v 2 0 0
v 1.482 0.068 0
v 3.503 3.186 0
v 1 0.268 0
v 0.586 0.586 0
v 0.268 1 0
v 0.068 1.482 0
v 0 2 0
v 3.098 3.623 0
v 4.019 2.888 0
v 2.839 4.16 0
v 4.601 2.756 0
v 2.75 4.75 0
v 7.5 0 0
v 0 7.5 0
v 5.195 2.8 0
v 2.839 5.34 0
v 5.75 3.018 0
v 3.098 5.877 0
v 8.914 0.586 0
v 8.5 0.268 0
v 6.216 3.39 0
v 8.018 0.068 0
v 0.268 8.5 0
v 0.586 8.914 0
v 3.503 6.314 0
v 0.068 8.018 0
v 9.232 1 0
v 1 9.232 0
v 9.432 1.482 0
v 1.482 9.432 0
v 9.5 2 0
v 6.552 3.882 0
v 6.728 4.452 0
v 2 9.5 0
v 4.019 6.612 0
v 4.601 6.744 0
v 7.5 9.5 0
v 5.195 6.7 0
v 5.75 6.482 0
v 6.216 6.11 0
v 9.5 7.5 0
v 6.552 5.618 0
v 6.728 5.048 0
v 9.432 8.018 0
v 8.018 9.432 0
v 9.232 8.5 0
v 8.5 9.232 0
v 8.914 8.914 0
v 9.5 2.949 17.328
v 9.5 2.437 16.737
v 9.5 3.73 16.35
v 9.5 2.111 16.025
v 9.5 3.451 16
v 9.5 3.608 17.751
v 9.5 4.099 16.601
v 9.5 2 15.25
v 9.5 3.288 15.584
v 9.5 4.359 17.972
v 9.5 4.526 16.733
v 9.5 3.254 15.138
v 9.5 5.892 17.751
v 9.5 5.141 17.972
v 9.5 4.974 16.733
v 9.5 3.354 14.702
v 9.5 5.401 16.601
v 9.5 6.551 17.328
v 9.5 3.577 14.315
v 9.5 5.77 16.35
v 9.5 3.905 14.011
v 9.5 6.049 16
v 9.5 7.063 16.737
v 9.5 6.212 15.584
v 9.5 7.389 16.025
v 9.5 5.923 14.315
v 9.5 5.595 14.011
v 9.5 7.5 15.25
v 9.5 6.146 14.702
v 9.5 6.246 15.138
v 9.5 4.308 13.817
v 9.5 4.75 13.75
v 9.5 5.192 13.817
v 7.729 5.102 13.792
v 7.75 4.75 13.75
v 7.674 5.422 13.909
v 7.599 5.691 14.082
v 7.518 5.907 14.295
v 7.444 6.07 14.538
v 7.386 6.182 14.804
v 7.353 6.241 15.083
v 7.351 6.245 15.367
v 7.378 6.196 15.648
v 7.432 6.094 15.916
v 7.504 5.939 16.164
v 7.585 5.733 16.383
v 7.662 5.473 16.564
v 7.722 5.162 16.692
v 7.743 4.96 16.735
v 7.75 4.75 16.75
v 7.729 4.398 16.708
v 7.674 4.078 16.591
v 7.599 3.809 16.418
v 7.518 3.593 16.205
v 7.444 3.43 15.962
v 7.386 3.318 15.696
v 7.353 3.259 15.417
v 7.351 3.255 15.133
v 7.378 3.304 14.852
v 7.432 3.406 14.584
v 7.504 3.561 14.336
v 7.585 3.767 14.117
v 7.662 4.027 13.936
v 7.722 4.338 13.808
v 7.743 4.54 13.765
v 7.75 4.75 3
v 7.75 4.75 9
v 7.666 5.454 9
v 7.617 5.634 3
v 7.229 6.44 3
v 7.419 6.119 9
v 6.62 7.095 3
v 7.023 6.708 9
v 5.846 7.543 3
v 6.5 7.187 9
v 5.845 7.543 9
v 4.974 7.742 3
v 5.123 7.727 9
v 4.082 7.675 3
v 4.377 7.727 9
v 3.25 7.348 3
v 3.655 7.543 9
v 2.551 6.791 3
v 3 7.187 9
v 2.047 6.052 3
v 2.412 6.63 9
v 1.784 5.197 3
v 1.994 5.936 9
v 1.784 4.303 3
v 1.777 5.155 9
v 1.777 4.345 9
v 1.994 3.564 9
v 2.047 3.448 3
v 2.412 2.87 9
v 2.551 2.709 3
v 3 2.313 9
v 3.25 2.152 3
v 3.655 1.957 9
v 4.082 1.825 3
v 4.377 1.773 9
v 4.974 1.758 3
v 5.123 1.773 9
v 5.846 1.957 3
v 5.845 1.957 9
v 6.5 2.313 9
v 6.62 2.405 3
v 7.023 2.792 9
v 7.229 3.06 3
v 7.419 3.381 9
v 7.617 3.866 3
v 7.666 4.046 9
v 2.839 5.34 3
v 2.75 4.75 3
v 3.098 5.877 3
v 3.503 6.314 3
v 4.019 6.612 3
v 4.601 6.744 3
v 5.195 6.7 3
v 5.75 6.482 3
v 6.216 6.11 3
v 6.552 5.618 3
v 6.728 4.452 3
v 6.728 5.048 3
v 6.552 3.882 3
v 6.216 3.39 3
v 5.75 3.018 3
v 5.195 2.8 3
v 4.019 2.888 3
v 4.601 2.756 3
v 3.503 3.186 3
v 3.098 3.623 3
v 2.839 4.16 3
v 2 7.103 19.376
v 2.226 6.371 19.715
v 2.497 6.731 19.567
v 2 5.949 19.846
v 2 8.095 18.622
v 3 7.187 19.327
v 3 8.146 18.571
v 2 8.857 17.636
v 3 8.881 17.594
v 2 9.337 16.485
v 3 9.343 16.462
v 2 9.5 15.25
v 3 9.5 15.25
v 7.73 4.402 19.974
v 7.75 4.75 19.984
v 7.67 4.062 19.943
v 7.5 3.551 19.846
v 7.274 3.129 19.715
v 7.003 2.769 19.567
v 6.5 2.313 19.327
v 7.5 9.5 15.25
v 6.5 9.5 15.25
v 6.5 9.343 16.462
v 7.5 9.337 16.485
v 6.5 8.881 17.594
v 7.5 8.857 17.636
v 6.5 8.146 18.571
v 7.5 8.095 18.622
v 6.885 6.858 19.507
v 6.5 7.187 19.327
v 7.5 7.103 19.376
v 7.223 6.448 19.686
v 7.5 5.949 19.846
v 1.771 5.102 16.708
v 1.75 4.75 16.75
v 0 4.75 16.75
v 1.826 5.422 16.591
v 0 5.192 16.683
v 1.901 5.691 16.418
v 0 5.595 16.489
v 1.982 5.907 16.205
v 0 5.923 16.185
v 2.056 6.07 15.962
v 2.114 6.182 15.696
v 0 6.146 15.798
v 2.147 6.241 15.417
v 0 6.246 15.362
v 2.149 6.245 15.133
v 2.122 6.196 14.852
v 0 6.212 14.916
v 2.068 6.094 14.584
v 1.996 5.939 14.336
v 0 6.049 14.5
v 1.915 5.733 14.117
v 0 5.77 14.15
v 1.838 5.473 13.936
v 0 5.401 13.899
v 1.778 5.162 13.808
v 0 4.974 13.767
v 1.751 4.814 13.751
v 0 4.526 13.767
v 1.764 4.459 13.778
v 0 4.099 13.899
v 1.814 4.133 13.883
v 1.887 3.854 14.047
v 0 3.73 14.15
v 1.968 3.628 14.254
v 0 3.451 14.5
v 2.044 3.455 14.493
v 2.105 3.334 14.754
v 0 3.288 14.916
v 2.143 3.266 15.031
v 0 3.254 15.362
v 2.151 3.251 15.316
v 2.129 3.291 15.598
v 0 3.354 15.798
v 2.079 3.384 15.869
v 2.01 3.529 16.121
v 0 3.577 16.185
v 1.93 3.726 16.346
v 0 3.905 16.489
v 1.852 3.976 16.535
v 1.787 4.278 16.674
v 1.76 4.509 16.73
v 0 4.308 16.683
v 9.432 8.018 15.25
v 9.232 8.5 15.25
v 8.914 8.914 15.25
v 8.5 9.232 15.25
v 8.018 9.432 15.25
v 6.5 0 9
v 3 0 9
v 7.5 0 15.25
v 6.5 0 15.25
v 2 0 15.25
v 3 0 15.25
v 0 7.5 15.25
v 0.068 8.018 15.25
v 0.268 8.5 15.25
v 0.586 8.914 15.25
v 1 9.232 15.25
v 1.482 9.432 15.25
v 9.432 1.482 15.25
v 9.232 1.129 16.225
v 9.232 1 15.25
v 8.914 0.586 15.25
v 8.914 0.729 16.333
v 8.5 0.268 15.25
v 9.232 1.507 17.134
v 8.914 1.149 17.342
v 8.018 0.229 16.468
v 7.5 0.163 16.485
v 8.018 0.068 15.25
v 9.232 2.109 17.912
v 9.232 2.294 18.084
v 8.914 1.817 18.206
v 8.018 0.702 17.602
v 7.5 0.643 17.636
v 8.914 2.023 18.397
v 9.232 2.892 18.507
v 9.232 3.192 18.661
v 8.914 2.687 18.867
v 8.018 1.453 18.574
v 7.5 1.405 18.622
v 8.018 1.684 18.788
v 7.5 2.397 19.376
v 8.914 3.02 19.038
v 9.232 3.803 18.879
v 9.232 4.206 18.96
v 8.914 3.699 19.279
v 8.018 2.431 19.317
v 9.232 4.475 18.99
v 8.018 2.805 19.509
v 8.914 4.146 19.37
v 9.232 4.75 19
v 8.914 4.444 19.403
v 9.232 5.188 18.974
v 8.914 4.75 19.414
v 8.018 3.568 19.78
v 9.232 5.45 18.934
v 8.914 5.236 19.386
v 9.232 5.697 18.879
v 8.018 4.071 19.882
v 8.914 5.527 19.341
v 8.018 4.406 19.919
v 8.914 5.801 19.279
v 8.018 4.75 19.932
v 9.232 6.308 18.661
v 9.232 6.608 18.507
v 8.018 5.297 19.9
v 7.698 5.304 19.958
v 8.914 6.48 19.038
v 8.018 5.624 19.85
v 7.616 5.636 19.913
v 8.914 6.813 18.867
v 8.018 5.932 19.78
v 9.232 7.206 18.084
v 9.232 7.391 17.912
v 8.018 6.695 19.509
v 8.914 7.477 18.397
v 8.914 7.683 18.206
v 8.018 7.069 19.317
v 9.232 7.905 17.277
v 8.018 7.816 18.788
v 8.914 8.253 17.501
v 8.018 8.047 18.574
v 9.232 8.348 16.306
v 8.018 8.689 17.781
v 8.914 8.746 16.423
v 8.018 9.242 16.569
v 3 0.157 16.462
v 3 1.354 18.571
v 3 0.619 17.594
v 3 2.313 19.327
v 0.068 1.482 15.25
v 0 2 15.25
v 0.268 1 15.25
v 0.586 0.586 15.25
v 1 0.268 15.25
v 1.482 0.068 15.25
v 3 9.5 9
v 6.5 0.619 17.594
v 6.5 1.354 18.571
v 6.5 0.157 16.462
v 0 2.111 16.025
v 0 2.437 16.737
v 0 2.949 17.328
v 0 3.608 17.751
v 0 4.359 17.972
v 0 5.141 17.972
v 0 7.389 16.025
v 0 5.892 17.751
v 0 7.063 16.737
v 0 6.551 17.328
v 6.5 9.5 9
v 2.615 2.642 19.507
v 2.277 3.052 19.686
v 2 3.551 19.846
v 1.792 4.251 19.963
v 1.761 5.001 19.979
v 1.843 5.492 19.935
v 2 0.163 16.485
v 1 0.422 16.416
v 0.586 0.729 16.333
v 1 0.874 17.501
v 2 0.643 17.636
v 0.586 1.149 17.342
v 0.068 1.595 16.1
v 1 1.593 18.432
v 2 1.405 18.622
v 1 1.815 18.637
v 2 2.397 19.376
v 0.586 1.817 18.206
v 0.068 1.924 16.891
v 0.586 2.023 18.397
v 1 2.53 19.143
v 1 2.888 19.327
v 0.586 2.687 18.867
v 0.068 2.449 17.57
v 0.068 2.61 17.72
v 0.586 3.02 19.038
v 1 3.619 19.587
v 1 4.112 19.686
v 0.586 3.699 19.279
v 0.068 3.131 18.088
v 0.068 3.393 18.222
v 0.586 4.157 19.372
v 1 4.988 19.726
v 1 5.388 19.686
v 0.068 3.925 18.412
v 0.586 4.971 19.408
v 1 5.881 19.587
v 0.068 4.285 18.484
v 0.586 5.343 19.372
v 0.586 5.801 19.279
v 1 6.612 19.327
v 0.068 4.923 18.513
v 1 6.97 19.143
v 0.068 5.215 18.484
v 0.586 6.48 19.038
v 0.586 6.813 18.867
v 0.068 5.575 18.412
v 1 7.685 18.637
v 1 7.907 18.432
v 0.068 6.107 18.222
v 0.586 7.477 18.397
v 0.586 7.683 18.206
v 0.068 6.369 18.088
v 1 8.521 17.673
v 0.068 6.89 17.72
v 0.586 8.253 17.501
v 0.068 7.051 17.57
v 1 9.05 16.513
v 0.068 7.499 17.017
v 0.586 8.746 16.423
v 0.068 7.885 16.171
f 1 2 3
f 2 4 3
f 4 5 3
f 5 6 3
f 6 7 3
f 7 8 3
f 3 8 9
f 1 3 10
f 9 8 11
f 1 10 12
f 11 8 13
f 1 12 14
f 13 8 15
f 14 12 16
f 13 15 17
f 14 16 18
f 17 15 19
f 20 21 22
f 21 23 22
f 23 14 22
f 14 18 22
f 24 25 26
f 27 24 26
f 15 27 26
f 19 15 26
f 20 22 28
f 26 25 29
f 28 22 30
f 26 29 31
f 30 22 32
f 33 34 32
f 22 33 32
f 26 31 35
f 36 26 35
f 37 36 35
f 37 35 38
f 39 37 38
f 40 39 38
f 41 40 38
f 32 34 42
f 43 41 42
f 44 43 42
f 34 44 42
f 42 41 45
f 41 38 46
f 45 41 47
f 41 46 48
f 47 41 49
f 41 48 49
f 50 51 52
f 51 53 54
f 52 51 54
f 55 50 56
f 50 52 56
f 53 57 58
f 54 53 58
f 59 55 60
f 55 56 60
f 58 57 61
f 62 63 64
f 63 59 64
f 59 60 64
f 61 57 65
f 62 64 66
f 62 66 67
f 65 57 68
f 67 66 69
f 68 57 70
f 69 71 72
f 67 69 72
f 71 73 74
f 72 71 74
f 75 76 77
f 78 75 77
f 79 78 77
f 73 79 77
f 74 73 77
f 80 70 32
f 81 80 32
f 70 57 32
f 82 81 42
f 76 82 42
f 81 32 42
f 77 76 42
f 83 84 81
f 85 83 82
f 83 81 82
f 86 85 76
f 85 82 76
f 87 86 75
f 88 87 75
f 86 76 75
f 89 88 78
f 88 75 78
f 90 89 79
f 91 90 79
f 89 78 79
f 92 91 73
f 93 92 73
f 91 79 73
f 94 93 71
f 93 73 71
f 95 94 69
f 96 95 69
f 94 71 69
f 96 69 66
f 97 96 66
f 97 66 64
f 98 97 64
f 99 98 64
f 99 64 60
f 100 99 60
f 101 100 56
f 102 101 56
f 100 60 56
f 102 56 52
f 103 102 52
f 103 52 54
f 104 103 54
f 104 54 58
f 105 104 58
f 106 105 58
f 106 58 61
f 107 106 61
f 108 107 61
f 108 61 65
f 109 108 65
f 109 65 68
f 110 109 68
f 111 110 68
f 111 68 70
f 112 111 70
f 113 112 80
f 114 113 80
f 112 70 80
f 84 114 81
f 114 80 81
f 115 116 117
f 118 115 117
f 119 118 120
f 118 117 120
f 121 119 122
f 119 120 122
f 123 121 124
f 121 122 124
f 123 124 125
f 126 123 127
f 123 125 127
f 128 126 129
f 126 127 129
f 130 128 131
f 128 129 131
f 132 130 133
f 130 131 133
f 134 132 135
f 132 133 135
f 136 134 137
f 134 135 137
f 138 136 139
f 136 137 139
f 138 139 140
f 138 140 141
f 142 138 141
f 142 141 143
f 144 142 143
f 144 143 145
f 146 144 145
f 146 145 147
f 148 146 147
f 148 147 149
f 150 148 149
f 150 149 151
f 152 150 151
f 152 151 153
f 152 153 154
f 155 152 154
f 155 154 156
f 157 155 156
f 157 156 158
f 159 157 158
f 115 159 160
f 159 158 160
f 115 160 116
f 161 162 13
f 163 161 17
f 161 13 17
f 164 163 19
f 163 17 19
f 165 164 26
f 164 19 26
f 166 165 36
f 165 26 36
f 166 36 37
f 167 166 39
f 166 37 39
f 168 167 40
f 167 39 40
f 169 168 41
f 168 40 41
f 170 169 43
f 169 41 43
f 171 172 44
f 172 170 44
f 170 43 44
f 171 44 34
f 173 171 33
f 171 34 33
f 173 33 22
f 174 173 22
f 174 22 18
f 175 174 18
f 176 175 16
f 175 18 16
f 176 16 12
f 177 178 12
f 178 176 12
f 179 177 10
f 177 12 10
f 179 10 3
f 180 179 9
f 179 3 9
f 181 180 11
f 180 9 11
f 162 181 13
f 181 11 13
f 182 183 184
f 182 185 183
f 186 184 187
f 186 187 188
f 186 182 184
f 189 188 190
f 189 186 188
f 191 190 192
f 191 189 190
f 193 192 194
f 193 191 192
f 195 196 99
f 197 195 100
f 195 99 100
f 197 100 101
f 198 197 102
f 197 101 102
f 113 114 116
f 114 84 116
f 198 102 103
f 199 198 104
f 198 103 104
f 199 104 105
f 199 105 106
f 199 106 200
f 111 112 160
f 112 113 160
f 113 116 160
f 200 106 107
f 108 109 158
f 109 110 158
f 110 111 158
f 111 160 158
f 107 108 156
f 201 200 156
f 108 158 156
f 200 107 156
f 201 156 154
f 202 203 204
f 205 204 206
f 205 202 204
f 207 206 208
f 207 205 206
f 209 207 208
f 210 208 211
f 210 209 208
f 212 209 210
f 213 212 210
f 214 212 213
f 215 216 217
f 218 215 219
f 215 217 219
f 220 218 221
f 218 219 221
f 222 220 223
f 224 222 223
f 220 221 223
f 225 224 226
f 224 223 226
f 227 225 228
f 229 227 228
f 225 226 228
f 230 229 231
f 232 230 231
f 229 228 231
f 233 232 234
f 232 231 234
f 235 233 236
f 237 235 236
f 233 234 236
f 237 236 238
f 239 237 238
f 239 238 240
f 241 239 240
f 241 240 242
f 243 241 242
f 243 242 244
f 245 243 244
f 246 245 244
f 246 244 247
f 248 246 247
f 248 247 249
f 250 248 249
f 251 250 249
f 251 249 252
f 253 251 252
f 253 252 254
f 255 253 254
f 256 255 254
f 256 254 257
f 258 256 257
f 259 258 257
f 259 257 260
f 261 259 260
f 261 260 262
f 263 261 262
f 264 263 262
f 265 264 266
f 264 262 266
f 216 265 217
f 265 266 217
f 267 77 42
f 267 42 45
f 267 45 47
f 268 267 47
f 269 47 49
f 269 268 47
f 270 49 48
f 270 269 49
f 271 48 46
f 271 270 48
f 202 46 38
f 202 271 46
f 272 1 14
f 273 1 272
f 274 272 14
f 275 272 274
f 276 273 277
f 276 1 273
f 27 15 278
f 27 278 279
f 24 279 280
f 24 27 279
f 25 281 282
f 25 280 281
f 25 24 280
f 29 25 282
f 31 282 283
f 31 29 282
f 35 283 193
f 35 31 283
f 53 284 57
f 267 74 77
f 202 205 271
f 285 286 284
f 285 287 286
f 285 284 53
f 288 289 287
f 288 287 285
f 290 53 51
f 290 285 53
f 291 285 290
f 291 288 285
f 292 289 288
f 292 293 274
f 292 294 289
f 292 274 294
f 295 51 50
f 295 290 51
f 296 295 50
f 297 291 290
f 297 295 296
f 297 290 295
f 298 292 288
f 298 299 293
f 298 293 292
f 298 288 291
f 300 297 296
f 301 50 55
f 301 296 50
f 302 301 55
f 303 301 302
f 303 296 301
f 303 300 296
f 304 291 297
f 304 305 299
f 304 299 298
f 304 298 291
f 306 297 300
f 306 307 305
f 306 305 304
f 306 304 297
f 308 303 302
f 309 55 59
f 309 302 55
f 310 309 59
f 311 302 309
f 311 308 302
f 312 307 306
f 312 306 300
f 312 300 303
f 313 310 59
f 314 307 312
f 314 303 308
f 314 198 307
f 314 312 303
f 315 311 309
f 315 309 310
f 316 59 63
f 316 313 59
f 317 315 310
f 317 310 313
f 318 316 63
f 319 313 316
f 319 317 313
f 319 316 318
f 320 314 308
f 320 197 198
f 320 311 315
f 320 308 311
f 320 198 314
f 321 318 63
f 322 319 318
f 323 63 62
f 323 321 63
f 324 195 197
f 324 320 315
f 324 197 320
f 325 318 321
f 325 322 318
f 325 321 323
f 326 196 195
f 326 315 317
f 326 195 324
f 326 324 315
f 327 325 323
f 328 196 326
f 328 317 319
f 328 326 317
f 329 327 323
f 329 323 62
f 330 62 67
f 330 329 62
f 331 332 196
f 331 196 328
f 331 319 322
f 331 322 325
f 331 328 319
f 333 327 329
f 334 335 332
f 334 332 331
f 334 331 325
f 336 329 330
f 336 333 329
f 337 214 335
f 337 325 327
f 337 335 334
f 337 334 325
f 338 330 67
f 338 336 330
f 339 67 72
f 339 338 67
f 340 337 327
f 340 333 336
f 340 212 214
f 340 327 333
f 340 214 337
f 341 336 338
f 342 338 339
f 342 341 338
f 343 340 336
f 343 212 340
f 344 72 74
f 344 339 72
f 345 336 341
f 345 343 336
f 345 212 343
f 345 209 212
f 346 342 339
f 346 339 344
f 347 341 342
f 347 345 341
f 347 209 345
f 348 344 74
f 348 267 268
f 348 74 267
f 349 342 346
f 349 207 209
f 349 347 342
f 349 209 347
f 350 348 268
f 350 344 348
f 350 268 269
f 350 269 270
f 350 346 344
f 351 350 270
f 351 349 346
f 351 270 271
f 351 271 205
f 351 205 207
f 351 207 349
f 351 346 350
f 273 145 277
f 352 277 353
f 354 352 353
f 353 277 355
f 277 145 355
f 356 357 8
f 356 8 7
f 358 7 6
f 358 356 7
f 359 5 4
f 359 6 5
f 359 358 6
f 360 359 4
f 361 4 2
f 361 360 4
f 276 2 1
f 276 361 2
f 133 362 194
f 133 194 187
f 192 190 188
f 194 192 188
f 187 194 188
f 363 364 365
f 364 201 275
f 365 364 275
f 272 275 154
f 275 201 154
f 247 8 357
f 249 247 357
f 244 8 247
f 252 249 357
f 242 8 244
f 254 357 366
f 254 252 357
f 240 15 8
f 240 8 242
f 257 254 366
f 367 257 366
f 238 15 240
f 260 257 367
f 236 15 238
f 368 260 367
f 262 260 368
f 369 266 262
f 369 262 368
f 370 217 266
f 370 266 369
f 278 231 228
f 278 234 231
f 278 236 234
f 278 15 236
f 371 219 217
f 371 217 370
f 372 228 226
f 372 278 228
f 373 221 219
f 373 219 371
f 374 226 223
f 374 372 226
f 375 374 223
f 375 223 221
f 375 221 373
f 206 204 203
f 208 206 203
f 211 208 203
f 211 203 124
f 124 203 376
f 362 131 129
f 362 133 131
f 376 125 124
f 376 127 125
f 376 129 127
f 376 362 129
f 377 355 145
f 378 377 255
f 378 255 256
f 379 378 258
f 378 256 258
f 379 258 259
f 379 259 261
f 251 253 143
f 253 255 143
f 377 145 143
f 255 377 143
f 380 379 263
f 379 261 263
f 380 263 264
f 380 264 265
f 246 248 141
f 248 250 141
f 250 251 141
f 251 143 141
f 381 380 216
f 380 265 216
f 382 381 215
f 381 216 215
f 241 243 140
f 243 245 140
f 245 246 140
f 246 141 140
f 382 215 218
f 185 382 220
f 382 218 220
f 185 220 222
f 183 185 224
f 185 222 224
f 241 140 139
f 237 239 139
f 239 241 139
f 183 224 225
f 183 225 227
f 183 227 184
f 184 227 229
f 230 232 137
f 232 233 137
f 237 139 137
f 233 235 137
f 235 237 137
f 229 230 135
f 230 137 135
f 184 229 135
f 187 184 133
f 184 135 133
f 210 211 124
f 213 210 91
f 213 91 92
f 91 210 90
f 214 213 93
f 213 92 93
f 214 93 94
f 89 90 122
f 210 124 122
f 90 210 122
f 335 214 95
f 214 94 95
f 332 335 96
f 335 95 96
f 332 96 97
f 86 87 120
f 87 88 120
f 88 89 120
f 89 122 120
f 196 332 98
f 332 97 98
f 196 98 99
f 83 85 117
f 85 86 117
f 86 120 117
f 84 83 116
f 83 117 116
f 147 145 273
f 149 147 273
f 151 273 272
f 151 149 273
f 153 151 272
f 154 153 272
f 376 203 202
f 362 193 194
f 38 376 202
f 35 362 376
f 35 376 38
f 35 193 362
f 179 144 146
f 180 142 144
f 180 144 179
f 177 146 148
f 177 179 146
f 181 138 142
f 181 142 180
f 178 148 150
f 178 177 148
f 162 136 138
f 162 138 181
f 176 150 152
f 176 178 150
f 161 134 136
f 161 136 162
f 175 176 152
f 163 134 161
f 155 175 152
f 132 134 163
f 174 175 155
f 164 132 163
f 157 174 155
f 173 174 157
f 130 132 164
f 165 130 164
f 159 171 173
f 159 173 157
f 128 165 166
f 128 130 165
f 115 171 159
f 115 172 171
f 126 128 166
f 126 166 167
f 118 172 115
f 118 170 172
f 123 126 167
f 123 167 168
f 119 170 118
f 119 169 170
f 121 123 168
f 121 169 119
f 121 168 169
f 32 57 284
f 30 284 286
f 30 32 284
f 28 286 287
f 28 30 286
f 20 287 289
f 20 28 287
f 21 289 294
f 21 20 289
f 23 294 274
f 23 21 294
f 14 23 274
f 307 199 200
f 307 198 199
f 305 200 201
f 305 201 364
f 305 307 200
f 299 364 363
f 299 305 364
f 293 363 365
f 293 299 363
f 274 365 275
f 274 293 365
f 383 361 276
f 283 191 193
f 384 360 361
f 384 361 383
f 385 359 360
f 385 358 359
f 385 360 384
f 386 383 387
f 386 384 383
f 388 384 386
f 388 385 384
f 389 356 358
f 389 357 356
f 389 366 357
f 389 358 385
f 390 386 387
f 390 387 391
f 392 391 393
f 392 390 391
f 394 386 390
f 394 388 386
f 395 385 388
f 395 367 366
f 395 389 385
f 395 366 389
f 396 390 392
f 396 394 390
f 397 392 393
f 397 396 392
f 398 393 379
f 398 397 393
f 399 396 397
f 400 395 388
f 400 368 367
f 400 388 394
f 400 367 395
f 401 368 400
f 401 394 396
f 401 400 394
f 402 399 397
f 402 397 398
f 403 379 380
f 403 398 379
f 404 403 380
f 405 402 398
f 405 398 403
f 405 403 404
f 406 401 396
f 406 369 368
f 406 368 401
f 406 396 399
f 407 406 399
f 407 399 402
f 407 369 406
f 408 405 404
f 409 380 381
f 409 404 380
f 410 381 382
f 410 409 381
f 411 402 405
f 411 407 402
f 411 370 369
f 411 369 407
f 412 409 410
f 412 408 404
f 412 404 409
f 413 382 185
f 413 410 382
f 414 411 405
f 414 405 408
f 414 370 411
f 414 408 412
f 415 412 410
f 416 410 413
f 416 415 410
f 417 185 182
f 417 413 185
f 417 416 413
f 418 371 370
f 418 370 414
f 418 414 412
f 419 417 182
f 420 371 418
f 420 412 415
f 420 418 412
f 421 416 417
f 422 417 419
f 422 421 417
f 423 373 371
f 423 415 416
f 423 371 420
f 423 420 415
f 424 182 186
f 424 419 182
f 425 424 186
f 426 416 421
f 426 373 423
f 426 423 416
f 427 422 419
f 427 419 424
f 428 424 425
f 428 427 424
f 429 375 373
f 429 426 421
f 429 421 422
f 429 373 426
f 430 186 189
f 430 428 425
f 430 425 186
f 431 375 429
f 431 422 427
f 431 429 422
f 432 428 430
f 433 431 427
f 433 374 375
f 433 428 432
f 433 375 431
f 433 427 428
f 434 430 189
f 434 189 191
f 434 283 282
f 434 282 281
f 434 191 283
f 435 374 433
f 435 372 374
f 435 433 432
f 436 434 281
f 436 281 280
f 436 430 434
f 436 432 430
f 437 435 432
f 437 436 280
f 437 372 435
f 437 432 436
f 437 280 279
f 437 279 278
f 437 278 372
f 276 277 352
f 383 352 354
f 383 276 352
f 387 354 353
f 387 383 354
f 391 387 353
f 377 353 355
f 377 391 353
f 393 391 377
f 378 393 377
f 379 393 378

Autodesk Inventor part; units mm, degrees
ref_plane "YZ Plane" through (0, 0, 0) normal (1, 0, 0) x (0, 1, 0)
ref_plane "XZ Plane" through (0, 0, 0) normal (0, 1, 0) x (-1, 0, 0)
ref_plane "XY Plane" through (0, 0, 0) normal (0, 0, 1) x (1, 0, 0)
sketch "Sketch1" plane through (0, 0, 0) normal (0, 0, 1) x (1, 0, 0)
  line L0 (0, 0) -> (9.5, 0)
  line L1 (9.5, 0) -> (9.5, 9.5)
  line L2 (9.5, 9.5) -> (0, 9.5)
  line L3 (0, 9.5) -> (0, 0)
  dimension "d0" = 9.5
  dimension "d1" = 9.5
extrude "Extrusion1" add sketch "Sketch1" along normal blind 9
sketch "Sketch2" plane through (9.5, 0, 0) normal (1, 0, 0) x (0, 0, -1)
  circle A0 centre (-15.25, 4.75) radius 4.75 construction
  line L0 (0, 0) -> (0, 9.5) projected
  line L1 (-9, 0) -> (-9, 9.5) projected
  line L2 (-9, 9.5) -> (-15.25, 9.5)
  line L3 (-9, 0) -> (-15.25, 0)
  arc A1 (-15.25, 9.5) -> (-15.25, 0) centre (-15.25, 4.75) ccw
  circle A2 centre (-15.25, 4.75) radius 1.5
  point P0 (0, 4.75)
  point P1 (0, 4.75)
  dimension "d4" = 9.5
  dimension "d5" = 15.25
  dimension "d6" = 3
extrude "Extrusion2" add sketch "Sketch2" against normal blind 3
sketch "Sketch3" plane through (0, 0, 0) normal (-1, 0, 0) x (0, 0, 1)
  circle A0 centre (15.25, 4.75) radius 1.5 projected
  line L0 (9, 0) -> (9, 9.5) projected
  line L1 (9, 0) -> (15.25, 0) projected
  arc A1 (15.25, 0) -> (15.25, 9.5) centre (15.25, 4.75) ccw projected
  line L2 (15.25, 9.5) -> (9, 9.5) projected
  point P0 (0, 0)
extrude "Extrusion3" add sketch "Sketch3" against normal blind 3
fillet "Fillet1" radius 2 6 edges at (0, 4.75, 20) (0, 0, 7.625) (0, 9.5, 7.625) (9.5, 4.75, 20) (9.5, 0, 7.625) (9.5, 9.5, 7.625)
sketch "Sketch4" plane through (0, 0, 0) normal (0, 0, -1) x (-1, 0, 0)
  circle A0 centre (-4.75, 4.75) radius 2
  line L0 (-7.5, 9.5) -> (-2, 9.5) projected
  line L1 (0, 7.5) -> (0, 2) projected
  point P0 (0, 0)
  point P1 (0, 4.75)
  point P2 (-4.75, 9.5)
  dimension "d12" = 4
extrude "Extrusion4" cut sketch "Sketch4" against normal through all
sketch "Sketch5" plane through (0, 0, 9) normal (0, 0, 1) x (1, 0, 0)
  circle A0 centre (4.75, 4.75) radius 2 projected
  circle A1 centre (4.75, 4.75) radius 3
  point P0 (0, 0)
  dimension "d15" = 6
extrude "Extrusion5" cut sketch "Sketch5" along normal blind 15 and the other way blind 6
properties part number "Arm6" material "ABS Plastic"
